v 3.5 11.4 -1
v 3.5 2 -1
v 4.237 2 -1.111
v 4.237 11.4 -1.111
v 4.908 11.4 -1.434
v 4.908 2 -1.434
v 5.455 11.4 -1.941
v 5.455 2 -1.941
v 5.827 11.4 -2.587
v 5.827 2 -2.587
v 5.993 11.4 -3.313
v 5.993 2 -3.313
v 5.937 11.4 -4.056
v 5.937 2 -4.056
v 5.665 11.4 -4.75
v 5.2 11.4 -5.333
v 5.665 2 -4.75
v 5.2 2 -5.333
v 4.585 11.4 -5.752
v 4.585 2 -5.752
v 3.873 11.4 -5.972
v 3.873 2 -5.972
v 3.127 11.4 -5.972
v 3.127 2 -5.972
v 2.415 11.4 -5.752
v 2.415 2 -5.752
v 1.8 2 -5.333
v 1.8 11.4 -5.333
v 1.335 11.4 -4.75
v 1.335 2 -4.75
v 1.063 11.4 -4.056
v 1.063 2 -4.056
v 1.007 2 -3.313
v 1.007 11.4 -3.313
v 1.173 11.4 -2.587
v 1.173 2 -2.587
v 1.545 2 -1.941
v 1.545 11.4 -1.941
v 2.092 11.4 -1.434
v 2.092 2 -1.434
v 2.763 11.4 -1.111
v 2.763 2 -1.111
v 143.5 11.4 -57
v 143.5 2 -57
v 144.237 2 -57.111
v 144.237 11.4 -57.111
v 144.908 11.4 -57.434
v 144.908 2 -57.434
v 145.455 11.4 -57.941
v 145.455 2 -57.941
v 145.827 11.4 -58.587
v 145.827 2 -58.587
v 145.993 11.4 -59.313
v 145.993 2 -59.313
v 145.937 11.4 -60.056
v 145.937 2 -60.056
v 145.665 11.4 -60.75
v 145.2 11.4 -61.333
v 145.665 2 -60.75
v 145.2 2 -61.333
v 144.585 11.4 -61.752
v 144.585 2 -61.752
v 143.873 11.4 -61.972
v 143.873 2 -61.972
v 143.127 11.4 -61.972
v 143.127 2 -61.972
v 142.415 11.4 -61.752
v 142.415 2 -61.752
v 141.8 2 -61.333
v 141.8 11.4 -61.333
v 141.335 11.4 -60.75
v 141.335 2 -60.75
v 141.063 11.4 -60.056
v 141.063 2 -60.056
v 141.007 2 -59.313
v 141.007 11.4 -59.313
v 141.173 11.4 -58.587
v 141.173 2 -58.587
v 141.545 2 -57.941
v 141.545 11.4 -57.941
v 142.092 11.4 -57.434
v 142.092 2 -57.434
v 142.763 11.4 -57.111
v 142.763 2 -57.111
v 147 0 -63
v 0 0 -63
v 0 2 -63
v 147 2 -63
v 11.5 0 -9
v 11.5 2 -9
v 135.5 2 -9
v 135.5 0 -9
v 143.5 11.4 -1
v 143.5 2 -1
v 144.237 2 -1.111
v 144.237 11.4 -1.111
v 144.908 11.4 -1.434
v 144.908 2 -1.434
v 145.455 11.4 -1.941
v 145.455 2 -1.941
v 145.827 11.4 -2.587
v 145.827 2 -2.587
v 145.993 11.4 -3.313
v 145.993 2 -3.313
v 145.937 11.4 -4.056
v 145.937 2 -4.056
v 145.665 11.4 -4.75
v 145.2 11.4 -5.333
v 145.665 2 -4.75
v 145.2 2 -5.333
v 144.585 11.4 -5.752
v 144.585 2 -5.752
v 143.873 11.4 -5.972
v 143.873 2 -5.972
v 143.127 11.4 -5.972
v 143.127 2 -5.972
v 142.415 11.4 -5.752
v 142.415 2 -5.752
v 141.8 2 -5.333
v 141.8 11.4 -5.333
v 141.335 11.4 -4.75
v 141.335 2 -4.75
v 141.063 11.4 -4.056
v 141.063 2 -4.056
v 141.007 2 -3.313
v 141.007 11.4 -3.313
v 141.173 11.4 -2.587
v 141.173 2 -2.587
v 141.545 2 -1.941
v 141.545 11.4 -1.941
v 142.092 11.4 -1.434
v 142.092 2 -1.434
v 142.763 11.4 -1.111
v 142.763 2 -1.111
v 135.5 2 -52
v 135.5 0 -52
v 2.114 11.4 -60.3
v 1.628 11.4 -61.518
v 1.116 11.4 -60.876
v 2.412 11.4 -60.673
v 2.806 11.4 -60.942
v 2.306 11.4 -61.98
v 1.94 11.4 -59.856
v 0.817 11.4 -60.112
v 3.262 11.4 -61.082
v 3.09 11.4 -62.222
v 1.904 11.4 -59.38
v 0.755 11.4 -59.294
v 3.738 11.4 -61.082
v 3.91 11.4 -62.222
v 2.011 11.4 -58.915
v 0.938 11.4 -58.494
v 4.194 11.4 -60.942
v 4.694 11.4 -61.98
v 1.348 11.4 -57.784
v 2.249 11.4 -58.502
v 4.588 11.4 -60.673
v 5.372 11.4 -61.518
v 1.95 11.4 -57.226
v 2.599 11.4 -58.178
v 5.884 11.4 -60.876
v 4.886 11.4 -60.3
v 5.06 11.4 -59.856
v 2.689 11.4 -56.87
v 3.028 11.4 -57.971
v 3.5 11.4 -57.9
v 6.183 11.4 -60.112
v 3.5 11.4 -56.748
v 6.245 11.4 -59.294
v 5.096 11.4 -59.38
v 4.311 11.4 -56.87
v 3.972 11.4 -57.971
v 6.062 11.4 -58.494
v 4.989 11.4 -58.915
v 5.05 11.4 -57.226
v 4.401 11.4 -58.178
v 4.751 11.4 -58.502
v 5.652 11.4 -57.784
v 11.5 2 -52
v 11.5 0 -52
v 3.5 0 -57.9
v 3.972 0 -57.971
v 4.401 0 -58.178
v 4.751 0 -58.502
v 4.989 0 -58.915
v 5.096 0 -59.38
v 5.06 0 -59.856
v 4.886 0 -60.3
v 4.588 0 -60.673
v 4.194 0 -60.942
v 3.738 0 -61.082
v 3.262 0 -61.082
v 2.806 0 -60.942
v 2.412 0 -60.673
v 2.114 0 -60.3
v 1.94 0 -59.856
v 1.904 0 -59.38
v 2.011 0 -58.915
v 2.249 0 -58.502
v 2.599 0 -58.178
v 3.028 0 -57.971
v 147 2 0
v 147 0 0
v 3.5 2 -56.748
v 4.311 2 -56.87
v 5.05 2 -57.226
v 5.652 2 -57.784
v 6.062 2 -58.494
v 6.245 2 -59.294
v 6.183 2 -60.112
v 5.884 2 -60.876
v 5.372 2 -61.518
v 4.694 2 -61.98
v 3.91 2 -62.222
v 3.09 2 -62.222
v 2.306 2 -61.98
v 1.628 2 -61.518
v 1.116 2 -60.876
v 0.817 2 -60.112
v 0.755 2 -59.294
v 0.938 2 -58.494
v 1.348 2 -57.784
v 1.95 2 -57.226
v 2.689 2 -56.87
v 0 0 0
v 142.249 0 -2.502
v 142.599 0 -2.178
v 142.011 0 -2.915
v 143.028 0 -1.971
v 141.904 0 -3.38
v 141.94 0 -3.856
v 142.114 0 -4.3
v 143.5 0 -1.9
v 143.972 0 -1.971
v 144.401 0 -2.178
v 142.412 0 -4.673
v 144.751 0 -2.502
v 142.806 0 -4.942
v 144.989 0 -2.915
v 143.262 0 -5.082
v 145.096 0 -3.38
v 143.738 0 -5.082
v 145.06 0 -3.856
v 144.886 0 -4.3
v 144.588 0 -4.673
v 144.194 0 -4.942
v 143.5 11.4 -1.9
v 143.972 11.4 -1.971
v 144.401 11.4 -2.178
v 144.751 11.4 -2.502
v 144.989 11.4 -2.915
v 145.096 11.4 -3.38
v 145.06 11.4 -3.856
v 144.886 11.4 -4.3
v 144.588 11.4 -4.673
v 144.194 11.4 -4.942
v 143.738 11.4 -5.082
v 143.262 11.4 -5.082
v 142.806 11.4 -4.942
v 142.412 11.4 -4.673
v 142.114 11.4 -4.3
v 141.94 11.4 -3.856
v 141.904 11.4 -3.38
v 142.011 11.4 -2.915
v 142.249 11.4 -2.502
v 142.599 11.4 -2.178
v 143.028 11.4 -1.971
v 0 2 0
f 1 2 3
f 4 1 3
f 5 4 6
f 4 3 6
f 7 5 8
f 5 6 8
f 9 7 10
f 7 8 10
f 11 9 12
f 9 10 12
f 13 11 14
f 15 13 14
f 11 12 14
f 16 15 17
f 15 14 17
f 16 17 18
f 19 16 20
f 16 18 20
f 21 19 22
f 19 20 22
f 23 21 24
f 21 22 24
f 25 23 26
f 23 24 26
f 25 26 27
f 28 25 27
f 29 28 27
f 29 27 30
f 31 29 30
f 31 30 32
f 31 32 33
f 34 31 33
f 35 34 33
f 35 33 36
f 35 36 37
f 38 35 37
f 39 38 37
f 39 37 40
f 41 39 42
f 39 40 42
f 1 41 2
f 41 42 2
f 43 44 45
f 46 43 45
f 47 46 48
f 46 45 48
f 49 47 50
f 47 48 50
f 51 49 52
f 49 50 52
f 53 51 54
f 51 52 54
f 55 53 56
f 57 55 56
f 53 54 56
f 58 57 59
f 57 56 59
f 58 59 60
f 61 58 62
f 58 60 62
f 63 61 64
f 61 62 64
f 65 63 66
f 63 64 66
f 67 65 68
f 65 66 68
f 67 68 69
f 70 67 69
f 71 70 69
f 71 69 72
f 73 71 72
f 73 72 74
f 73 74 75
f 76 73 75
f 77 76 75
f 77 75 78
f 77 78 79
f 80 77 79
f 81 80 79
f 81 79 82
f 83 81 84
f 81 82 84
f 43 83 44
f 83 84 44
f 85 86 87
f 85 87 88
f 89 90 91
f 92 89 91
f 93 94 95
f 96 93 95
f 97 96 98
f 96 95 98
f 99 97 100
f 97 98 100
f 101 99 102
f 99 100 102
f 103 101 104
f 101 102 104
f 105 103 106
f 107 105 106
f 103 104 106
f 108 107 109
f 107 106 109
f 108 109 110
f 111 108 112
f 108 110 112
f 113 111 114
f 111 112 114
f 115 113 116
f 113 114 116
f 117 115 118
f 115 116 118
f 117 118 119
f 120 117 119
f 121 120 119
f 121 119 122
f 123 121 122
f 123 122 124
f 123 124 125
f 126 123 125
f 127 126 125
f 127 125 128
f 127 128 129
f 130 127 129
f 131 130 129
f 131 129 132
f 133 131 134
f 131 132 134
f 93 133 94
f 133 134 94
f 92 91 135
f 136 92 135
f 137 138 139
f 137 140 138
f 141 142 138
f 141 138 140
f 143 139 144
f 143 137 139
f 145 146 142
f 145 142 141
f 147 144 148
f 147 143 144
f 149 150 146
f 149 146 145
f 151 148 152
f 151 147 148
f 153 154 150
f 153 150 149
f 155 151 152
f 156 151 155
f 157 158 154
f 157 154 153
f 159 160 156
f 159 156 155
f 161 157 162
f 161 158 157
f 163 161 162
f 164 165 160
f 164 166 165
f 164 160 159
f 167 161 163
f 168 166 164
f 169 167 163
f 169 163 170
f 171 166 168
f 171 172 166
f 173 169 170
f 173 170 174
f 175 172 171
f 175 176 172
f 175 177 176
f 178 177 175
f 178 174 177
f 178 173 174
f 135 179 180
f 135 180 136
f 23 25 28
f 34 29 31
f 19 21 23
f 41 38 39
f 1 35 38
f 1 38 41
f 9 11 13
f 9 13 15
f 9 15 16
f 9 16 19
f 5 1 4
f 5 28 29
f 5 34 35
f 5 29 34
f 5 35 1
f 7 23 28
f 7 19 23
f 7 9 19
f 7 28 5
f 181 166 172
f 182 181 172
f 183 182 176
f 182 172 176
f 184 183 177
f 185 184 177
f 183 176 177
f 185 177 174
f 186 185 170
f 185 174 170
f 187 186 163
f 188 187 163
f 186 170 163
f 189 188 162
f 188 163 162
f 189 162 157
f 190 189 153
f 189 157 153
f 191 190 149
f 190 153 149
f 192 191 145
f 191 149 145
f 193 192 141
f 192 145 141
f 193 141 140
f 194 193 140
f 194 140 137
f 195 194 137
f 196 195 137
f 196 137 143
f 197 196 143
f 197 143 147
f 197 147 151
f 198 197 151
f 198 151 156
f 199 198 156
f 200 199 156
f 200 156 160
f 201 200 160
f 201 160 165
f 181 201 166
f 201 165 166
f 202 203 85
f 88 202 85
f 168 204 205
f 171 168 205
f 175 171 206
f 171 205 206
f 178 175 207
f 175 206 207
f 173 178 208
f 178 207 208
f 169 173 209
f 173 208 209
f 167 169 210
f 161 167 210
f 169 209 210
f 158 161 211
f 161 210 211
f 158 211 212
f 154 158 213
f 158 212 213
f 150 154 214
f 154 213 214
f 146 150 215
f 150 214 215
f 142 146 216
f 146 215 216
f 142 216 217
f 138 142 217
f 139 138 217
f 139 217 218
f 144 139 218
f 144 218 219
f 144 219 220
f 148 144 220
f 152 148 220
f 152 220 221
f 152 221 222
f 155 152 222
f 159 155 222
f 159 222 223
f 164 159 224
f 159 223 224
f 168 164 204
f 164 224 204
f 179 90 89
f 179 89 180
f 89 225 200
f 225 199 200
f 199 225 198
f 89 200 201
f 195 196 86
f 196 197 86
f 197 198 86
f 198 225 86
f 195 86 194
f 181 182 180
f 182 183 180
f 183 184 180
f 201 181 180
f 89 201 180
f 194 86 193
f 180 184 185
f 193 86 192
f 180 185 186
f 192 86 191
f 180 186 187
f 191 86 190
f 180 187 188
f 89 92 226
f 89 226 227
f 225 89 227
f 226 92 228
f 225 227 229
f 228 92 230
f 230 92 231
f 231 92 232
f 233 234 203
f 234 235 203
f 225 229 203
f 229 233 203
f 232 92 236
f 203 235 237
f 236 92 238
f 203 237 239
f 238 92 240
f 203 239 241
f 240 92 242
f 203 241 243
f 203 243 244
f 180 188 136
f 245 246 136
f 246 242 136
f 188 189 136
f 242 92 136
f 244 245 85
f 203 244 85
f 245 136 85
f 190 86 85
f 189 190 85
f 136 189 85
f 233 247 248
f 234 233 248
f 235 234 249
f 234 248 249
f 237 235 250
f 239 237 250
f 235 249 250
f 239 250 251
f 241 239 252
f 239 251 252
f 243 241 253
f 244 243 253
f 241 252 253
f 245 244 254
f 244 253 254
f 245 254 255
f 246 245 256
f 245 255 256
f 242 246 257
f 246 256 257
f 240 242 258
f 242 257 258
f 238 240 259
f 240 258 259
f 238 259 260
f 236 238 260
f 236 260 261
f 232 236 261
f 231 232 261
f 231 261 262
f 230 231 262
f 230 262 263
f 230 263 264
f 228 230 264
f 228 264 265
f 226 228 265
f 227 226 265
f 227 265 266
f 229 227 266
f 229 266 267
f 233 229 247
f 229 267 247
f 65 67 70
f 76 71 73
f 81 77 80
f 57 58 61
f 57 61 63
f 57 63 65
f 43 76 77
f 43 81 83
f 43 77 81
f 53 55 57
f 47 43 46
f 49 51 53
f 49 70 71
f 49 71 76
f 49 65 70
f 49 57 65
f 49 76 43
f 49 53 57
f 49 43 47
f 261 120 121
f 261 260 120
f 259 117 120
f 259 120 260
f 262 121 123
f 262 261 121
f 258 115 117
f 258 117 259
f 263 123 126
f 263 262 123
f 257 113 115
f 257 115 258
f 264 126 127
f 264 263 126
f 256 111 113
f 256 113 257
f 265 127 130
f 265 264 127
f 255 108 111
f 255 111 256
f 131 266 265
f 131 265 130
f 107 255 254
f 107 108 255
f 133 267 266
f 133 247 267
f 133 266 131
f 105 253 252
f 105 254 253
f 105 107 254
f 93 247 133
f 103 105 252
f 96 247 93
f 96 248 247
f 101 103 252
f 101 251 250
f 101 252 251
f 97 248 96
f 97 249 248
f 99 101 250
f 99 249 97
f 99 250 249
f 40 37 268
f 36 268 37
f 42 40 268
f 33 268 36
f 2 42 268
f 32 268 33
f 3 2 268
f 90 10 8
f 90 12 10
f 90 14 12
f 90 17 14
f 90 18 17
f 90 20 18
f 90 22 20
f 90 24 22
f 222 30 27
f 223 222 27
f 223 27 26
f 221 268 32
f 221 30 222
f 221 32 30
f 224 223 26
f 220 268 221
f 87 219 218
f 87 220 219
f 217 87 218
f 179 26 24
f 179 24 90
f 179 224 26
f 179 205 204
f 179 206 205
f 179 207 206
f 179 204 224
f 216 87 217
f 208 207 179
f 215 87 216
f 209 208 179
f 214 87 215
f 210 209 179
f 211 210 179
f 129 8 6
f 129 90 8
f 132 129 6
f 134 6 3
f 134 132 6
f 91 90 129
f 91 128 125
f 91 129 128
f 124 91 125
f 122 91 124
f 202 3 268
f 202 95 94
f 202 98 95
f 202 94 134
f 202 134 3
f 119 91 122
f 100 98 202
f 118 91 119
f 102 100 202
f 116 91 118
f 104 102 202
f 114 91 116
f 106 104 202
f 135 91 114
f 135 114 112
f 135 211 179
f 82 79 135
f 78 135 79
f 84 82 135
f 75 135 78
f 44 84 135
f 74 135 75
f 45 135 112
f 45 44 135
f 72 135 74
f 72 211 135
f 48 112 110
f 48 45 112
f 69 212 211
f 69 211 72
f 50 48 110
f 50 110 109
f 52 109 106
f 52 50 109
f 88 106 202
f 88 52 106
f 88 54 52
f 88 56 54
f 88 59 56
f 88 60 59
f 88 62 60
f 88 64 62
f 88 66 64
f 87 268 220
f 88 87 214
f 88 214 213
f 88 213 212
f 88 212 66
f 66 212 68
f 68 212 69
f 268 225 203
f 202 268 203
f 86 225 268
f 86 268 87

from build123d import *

# Parameters (mm, degrees)
SKIZZE3_W                       = 147
SKIZZE3_H                       = 63
AUFSATZ_LINEAR_AUSTRAGEN2_DEPTH = 2
SKIZZE4_W                       = 124
SKIZZE4_H                       = 43
SCHNITT_LINEAR_AUSTRAGEN1_DEPTH = 2
SKIZZE5_R                       = 2.752378696
AUFSATZ_LINEAR_AUSTRAGEN3_DEPTH = 9.4
SKIZZE6_R                       = 1.6
SCHNITT_LINEAR_AUSTRAGEN2_DEPTH = 11.4
SKIZZE7_R                       = 2.5
AUFSATZ_LINEAR_AUSTRAGEN4_DEPTH = 9.4
SKIZZE8_R                       = 1.6
SCHNITT_LINEAR_AUSTRAGEN3_DEPTH = 11.4
SKIZZE9_R                       = 2.5
AUFSATZ_LINEAR_AUSTRAGEN5_DEPTH = 9.4


with BuildPart() as part:
    # Skizze3 → Aufsatz-Linear austragen2 (new body)
    with BuildSketch(Plane(origin=(0, 0, 0), x_dir=(1, 0, 0), z_dir=(0, 1, 0))):
        with Locations((73.5, 31.5)):
            Rectangle(SKIZZE3_W, SKIZZE3_H)
    extrude(amount=AUFSATZ_LINEAR_AUSTRAGEN2_DEPTH)

    # Skizze4 → Schnitt-Linear austragen1 (cut)
    with BuildSketch(Plane(origin=(0, 2, 0), x_dir=(1, 0, 0), z_dir=(0, 1, 0))):
        with Locations((73.5, 30.5)):
            Rectangle(SKIZZE4_W, SKIZZE4_H)
    extrude(amount=-SCHNITT_LINEAR_AUSTRAGEN1_DEPTH, mode=Mode.SUBTRACT)

    # Skizze5 → Aufsatz-Linear austragen3 (add)
    with BuildSketch(Plane(origin=(0, 2, 0), x_dir=(1, 0, 0), z_dir=(0, 1, 0))):
        with Locations(Location((3.5, 59.5, 0), (0, 0, 270))):
            Circle(SKIZZE5_R)
    extrude(amount=AUFSATZ_LINEAR_AUSTRAGEN3_DEPTH)

    # Skizze6 → Schnitt-Linear austragen2 (cut)
    with BuildSketch(Plane(origin=(0, 11.4, 0), x_dir=(1, 0, 0), z_dir=(0, 1, 0))):
        with Locations(Location((3.5, 59.5, 0), (0, 0, 270))):
            Circle(SKIZZE6_R)
    extrude(amount=-SCHNITT_LINEAR_AUSTRAGEN2_DEPTH, mode=Mode.SUBTRACT)

    # Skizze7 → Aufsatz-Linear austragen4 (add)
    with BuildSketch(Plane(origin=(0, 2, 0), x_dir=(1, 0, 0), z_dir=(0, 1, 0))):
        with Locations(Location((143.5, 3.5, 0), (0, 0, 270))):
            Circle(SKIZZE7_R)
    extrude(amount=AUFSATZ_LINEAR_AUSTRAGEN4_DEPTH)

    # Skizze8 → Schnitt-Linear austragen3 (cut)
    with BuildSketch(Plane(origin=(0, 11.4, 0), x_dir=(1, 0, 0), z_dir=(0, 1, 0))):
        with Locations(Location((143.5, 3.5, 0), (0, 0, 270))):
            Circle(SKIZZE8_R)
    extrude(amount=-SCHNITT_LINEAR_AUSTRAGEN3_DEPTH, mode=Mode.SUBTRACT)

    # Skizze9 → Aufsatz-Linear austragen5 (add)
    with BuildSketch(Plane(origin=(0, 2, 0), x_dir=(1, 0, 0), z_dir=(0, 1, 0))):
        with Locations(Location((143.5, 59.5, 0), (0, 0, 270))):
            Circle(SKIZZE9_R)
        with Locations(Location((3.5, 3.5, 0), (0, 0, 270))):
            Circle(SKIZZE9_R)
    extrude(amount=AUFSATZ_LINEAR_AUSTRAGEN5_DEPTH)


solid = part.part
